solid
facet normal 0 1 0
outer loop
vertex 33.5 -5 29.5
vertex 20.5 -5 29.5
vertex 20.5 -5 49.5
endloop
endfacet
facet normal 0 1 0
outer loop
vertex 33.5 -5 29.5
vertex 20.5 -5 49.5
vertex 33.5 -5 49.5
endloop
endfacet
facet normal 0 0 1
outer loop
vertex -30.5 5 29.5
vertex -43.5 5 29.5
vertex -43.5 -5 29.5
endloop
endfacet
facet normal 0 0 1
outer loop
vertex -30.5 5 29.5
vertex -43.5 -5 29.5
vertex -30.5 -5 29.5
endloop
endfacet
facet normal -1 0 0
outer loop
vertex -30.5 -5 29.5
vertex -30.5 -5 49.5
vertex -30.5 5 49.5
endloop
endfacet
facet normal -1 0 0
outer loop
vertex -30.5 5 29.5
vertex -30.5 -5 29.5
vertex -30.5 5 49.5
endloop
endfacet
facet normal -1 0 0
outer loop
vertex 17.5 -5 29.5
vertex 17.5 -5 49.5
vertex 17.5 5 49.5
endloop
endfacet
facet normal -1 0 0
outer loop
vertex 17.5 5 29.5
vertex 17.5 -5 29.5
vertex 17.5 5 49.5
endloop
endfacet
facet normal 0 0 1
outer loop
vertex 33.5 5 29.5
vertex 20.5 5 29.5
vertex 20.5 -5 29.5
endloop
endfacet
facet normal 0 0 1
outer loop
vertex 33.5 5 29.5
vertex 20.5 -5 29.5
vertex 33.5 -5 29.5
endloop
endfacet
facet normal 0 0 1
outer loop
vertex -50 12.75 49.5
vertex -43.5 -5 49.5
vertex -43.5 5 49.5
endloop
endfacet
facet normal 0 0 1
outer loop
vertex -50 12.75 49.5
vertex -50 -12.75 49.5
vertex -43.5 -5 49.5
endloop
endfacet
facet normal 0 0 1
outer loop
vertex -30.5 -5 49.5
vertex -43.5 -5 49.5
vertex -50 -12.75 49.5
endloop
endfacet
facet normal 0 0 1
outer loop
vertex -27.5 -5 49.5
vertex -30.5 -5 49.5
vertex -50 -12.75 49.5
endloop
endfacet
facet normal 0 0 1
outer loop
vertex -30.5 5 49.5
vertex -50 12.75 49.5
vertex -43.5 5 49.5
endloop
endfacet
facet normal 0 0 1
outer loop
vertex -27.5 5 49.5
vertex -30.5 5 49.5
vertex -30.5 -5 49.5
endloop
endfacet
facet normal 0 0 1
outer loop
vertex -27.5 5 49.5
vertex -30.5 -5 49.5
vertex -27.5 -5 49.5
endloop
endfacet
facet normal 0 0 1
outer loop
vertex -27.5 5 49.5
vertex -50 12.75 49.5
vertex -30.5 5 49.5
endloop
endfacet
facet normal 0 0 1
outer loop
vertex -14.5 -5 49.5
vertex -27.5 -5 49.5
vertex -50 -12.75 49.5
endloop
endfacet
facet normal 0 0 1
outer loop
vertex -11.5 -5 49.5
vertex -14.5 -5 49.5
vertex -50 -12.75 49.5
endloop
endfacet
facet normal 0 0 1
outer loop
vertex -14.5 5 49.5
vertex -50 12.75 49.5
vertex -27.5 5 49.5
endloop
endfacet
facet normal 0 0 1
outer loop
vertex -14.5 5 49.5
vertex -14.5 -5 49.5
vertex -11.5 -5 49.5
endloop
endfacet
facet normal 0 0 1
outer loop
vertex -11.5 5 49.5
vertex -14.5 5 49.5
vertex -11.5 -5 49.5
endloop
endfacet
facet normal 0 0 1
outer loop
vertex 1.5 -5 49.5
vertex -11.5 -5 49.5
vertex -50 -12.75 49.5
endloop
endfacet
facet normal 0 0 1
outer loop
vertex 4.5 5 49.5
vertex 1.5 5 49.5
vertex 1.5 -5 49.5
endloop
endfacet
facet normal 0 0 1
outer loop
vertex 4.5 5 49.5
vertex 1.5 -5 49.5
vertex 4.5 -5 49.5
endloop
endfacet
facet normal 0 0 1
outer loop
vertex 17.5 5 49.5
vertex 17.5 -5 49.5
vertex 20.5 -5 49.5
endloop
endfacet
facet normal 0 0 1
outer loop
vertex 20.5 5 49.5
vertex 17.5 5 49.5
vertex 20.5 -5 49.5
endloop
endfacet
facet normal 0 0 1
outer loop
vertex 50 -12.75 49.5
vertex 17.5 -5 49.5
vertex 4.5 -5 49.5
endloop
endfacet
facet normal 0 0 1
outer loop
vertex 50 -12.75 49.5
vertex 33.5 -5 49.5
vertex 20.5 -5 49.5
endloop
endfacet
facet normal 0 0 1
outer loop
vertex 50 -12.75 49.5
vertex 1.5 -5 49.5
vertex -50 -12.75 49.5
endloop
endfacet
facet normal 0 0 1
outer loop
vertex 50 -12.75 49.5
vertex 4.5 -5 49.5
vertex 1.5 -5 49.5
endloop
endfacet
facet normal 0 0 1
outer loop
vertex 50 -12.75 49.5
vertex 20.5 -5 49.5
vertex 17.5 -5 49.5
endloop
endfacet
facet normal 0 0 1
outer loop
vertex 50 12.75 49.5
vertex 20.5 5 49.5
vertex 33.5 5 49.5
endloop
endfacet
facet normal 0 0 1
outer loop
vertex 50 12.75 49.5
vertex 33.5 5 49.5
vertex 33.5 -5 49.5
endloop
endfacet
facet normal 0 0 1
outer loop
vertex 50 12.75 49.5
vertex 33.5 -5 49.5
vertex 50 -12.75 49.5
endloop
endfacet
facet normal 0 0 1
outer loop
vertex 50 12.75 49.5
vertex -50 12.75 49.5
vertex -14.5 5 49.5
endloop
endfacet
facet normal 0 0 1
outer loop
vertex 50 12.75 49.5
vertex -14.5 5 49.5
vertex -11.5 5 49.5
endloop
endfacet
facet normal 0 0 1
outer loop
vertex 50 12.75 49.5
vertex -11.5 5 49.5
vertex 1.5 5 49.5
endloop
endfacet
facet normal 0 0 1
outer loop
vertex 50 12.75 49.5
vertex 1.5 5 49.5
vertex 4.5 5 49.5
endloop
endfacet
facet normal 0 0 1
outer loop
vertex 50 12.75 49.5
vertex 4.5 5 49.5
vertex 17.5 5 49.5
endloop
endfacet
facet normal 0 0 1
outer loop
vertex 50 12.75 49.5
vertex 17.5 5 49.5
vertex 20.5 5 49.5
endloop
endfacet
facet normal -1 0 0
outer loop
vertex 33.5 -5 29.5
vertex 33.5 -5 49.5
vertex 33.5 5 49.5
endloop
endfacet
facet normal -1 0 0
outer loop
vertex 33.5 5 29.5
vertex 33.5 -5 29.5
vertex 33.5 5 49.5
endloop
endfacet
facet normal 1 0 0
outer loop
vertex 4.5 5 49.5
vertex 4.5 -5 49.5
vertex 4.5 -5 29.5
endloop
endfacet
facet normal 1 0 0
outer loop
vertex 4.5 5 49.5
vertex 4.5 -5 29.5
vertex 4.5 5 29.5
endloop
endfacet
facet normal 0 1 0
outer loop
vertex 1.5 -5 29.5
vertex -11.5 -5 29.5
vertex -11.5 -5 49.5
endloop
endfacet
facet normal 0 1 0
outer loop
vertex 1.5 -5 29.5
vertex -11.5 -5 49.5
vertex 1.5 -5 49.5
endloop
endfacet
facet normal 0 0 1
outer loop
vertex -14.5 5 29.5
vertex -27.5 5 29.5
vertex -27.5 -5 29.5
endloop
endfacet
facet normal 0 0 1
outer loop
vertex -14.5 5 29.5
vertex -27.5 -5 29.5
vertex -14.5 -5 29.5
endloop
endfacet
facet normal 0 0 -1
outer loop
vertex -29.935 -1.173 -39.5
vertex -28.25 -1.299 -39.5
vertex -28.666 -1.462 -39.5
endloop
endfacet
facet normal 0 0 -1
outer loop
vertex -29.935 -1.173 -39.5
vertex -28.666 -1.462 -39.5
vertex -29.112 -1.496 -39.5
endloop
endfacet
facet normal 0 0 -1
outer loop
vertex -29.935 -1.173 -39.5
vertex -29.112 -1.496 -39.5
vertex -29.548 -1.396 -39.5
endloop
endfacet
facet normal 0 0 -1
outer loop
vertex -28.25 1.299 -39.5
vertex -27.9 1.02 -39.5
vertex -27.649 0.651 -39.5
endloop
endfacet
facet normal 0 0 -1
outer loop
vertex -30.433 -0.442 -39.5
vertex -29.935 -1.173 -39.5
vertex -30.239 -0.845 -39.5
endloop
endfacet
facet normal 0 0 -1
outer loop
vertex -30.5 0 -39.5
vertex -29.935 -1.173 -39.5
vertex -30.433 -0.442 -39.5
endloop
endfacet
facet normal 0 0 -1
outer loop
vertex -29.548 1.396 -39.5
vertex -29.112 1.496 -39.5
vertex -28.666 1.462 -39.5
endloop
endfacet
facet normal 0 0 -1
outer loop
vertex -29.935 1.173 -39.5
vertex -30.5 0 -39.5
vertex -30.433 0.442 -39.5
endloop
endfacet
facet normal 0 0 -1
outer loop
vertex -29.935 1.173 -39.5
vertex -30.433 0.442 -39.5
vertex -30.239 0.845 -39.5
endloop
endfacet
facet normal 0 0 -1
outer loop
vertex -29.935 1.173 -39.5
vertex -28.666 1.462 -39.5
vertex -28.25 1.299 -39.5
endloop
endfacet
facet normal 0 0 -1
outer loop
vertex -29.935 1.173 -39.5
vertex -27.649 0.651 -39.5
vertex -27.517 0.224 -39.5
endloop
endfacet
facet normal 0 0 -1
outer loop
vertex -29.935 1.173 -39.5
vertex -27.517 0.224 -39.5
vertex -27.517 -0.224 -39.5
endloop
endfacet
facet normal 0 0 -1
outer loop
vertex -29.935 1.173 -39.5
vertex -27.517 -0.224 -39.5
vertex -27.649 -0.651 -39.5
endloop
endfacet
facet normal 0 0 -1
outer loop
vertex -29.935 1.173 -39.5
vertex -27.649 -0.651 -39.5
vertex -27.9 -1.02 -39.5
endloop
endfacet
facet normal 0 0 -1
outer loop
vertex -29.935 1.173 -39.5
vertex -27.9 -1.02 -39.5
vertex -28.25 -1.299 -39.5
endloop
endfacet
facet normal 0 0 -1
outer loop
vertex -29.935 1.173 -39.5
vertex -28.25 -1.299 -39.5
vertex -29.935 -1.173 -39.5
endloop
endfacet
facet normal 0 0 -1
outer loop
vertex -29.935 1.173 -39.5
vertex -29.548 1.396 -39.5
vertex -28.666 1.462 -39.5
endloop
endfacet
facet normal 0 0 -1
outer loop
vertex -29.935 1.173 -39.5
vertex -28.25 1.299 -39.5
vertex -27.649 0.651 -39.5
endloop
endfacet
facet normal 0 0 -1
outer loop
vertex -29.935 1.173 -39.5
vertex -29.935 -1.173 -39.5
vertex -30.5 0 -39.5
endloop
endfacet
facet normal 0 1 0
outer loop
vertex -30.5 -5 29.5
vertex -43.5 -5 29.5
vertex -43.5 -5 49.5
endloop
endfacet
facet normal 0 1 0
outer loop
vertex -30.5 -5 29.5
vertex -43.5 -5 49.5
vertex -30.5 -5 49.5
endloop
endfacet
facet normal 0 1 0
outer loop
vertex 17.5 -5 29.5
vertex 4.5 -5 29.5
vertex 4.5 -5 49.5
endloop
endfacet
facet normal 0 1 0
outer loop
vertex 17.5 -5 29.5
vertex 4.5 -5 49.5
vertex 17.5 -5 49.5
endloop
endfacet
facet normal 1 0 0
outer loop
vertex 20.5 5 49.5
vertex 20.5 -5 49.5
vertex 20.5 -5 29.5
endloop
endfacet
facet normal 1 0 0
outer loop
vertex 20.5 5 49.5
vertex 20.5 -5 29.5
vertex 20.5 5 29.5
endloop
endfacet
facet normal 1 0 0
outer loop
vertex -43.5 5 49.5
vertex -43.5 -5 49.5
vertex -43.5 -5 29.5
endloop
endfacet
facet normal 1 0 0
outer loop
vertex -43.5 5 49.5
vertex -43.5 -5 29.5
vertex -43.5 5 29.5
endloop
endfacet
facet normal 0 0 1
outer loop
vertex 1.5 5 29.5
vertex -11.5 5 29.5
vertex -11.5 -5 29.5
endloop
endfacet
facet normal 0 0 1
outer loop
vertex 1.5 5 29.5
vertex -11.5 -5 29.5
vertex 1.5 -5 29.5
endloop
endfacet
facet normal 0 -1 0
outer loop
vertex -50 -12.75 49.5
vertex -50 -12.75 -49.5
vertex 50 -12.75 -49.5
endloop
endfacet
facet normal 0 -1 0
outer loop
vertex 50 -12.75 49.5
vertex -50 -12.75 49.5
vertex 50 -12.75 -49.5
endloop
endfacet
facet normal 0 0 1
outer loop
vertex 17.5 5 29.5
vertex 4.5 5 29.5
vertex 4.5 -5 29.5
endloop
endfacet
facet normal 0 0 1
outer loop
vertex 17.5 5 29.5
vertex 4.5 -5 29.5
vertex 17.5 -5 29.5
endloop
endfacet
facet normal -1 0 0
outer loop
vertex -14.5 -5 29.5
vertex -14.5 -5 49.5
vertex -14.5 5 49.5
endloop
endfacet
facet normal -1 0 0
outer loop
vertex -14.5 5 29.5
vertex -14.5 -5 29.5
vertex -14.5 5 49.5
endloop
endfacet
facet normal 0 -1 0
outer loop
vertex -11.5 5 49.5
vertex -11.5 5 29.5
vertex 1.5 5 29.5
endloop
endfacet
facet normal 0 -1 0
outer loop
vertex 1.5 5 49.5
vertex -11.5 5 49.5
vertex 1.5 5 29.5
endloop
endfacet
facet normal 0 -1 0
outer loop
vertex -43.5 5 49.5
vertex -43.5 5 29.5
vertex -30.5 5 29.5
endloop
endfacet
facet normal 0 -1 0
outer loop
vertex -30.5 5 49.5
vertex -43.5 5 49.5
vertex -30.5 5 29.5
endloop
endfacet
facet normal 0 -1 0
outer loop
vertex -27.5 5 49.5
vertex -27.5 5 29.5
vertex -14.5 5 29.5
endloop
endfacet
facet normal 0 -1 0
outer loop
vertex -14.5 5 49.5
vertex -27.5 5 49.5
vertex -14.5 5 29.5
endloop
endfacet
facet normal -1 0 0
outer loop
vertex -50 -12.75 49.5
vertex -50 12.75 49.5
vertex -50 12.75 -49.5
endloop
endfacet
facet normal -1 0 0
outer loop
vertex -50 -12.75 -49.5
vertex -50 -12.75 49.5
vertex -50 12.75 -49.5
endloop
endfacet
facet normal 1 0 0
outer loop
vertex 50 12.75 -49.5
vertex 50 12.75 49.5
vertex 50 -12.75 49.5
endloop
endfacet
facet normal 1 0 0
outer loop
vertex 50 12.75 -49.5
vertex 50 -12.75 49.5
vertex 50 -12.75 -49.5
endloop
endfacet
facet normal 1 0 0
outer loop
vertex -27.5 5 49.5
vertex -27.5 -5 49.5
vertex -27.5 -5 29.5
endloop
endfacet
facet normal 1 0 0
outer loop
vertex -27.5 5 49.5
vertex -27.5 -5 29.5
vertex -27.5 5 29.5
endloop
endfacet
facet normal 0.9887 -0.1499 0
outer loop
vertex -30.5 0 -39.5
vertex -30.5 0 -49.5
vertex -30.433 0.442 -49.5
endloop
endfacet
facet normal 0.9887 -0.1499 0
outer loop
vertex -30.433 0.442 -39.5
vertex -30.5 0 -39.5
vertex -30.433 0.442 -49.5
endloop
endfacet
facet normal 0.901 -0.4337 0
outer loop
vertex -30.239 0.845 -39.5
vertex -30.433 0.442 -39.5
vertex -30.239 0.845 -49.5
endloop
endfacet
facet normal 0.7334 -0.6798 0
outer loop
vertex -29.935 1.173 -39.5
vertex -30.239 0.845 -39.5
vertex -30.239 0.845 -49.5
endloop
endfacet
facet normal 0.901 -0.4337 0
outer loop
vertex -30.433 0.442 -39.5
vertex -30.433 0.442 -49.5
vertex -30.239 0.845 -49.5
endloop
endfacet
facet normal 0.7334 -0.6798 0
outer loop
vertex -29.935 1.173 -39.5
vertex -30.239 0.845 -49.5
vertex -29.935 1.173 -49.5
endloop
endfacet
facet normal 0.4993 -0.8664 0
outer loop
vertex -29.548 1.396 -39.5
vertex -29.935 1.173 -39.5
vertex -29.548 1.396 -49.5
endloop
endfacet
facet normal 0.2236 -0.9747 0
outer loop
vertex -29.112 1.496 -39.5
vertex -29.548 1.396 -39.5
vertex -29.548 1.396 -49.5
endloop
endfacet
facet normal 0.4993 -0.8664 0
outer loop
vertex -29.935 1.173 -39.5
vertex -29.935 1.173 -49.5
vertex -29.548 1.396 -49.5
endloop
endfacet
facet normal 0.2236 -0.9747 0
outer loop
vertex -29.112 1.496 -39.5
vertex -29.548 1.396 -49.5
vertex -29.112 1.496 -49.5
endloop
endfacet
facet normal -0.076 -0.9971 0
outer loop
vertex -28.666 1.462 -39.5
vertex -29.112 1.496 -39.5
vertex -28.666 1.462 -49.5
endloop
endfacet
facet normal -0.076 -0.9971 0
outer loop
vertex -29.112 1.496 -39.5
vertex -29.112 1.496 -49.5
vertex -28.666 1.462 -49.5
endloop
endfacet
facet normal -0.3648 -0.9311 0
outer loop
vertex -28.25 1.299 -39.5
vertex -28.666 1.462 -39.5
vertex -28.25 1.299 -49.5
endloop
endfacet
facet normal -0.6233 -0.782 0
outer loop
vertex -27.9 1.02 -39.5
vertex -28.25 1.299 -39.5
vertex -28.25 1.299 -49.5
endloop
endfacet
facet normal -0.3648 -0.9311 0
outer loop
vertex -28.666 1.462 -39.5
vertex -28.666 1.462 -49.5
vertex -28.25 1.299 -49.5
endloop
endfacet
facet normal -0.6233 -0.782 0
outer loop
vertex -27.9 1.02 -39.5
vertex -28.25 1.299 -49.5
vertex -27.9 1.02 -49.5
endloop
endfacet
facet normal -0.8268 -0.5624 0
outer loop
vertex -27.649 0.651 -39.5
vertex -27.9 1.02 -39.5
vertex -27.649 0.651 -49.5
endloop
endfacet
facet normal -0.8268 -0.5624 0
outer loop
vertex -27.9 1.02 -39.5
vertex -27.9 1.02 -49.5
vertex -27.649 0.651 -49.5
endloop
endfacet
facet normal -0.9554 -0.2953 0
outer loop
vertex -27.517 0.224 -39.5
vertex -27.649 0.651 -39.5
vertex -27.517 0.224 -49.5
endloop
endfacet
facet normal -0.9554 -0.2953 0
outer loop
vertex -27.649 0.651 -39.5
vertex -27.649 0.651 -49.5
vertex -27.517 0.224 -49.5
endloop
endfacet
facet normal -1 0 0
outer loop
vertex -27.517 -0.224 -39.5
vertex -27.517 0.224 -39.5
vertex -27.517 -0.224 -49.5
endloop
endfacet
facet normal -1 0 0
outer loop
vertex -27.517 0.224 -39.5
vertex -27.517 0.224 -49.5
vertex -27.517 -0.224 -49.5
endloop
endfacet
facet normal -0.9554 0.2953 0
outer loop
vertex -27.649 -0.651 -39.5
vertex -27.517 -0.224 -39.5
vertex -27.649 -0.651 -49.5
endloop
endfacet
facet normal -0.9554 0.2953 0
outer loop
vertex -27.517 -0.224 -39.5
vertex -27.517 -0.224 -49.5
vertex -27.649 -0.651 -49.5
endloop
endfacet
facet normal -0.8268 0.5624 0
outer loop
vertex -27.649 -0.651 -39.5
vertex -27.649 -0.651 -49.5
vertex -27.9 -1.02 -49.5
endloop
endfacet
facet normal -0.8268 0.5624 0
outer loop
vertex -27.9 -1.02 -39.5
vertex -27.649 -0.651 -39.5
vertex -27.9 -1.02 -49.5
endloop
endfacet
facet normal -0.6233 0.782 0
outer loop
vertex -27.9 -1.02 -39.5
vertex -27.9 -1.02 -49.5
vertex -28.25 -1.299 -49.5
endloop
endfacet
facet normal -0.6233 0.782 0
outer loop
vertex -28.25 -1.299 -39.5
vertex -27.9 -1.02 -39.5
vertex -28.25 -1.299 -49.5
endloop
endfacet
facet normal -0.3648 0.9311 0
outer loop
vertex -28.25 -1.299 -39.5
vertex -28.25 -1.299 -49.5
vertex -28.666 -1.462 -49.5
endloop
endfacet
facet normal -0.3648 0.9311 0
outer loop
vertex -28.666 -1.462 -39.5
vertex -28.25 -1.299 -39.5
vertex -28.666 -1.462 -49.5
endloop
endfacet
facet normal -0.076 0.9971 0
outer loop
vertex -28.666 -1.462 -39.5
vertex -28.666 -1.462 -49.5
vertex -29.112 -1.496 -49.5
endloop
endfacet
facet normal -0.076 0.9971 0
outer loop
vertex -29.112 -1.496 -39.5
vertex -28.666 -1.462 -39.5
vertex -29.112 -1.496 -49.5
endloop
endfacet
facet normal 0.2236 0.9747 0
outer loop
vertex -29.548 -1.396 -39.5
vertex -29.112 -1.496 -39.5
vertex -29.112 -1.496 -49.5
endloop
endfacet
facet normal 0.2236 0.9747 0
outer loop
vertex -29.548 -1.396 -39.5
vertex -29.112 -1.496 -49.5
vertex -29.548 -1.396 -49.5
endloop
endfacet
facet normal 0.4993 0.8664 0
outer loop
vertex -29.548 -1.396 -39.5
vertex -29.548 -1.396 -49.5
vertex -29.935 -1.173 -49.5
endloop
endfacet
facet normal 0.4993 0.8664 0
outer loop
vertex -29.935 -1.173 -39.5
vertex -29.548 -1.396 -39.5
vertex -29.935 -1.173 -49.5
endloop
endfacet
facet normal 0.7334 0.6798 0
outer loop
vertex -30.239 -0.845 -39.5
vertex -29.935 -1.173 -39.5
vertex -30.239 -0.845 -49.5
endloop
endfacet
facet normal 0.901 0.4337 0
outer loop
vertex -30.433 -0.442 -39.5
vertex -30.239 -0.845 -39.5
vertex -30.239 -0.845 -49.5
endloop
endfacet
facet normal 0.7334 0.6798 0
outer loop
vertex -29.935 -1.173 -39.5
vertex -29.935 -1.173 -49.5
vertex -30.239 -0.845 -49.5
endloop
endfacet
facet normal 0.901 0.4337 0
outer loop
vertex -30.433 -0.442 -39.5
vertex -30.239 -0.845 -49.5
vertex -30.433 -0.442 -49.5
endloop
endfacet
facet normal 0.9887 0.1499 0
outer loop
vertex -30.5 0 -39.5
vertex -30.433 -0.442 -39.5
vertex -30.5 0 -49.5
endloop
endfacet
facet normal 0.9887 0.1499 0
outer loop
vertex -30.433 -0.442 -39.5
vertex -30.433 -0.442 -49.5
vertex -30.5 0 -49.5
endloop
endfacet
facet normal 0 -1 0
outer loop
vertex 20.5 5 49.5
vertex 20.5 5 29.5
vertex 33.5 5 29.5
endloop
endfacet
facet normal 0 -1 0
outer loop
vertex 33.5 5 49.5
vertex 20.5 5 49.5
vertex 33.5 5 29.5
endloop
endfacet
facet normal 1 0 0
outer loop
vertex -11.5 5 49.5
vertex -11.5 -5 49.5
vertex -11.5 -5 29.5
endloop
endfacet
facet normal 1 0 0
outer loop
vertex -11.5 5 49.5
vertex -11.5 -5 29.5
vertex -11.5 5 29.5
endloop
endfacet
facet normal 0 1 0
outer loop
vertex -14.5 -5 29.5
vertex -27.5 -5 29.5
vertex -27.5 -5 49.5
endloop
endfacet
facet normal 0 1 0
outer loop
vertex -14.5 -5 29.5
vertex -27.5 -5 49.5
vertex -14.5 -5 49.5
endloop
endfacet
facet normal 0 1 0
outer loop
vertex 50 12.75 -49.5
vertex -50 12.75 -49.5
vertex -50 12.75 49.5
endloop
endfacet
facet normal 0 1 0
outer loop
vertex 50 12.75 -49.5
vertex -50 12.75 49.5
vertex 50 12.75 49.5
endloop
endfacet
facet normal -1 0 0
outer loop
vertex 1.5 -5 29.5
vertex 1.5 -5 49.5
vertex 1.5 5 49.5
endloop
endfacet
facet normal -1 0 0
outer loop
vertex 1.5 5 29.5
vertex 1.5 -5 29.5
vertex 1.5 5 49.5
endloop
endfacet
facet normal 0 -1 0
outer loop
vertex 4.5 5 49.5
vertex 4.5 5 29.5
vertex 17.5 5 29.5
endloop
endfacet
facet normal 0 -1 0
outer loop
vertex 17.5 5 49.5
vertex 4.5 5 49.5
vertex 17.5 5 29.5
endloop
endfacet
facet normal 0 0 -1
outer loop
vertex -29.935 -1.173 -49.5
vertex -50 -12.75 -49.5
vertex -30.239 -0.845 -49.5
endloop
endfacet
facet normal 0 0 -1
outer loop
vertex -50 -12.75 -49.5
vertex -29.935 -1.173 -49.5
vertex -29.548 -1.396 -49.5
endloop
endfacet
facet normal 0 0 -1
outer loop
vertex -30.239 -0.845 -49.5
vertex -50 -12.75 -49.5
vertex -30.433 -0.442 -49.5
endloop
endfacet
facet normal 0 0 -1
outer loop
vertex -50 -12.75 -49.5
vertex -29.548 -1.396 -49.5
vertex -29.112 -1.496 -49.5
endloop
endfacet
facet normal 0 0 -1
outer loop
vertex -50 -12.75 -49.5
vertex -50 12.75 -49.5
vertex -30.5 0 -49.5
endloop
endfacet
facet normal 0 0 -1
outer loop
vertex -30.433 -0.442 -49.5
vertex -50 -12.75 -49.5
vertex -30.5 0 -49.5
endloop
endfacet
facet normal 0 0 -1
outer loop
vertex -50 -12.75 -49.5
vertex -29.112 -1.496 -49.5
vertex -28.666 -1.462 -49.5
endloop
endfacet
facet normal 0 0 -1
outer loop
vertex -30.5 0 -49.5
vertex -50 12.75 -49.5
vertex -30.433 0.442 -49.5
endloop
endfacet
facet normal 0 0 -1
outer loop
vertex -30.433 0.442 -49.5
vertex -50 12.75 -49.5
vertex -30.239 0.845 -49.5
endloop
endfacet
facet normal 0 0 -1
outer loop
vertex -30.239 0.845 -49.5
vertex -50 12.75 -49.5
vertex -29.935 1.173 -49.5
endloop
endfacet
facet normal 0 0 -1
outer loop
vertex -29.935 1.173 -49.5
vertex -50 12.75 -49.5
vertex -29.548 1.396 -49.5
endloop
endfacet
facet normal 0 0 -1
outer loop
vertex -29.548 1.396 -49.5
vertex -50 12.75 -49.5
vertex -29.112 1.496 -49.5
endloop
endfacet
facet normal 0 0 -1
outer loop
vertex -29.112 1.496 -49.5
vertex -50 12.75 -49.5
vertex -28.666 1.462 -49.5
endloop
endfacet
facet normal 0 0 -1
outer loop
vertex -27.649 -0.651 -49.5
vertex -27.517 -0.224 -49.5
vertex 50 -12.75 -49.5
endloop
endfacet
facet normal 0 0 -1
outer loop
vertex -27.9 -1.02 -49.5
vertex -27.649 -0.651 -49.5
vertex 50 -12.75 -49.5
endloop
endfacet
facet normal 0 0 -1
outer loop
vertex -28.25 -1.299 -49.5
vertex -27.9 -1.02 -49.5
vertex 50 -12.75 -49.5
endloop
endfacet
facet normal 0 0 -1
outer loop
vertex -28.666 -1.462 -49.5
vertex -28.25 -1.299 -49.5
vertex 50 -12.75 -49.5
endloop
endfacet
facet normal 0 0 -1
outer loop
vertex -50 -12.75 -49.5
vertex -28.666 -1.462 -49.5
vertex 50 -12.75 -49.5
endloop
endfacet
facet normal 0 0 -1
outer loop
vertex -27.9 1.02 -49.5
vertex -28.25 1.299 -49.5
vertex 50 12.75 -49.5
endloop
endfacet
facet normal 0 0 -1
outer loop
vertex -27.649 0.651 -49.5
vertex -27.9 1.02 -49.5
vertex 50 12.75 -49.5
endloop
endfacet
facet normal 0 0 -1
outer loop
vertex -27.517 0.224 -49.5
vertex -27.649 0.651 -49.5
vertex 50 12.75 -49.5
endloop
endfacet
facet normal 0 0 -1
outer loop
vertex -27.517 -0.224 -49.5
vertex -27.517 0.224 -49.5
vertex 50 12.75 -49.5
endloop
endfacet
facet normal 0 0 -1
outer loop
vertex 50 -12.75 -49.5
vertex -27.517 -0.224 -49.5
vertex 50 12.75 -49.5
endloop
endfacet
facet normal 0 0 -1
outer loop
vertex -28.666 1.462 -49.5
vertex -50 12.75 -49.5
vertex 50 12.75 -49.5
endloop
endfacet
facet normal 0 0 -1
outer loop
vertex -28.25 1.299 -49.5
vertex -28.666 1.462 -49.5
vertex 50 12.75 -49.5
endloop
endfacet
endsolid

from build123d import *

# Parameters (mm, degrees)
SKETCH1_W           = 100
SKETCH1_H           = 99
BOSS_EXTRUDE1_DEPTH = 12.75
SKETCH2_W           = 13
SKETCH2_H           = 10
CUT_EXTRUDE1_DEPTH  = 20
LPATTERN1_COUNT     = 5
LPATTERN1_PITCH     = 16
SKETCH3_R           = 1.5
CUT_EXTRUDE2_DEPTH  = 10


with BuildPart() as part:
    # Sketch1 → Boss-Extrude1 (new, symmetric)
    with BuildSketch(Plane(origin=(0, 0, 0), x_dir=(1, 0, 0), z_dir=(0, 1, 0))):
        Rectangle(SKETCH1_W, SKETCH1_H)
    extrude(amount=BOSS_EXTRUDE1_DEPTH, both=True)

    # Sketch2 → Cut-Extrude1 (cut)
    with BuildSketch(Plane.XY.offset(49.5)):
        with Locations((-37, 0)):
            Rectangle(SKETCH2_W, SKETCH2_H)
    cut_extrude1 = extrude(amount=-CUT_EXTRUDE1_DEPTH, mode=Mode.SUBTRACT)

    # LPattern1: Cut-Extrude1 ×5
    with Locations(*[(i * LPATTERN1_PITCH, 0, 0) for i in range(1, LPATTERN1_COUNT)]):
        add(cut_extrude1, mode=Mode.SUBTRACT)

    # Sketch3 → Cut-Extrude2 (cut)
    with BuildSketch(Plane(origin=(0, 0, -49.5), x_dir=(-1, 0, 0), z_dir=(0, 0, -1))):
        with Locations((29, 0)):
            Circle(SKETCH3_R)
    extrude(amount=-CUT_EXTRUDE2_DEPTH, mode=Mode.SUBTRACT)


solid = part.part
